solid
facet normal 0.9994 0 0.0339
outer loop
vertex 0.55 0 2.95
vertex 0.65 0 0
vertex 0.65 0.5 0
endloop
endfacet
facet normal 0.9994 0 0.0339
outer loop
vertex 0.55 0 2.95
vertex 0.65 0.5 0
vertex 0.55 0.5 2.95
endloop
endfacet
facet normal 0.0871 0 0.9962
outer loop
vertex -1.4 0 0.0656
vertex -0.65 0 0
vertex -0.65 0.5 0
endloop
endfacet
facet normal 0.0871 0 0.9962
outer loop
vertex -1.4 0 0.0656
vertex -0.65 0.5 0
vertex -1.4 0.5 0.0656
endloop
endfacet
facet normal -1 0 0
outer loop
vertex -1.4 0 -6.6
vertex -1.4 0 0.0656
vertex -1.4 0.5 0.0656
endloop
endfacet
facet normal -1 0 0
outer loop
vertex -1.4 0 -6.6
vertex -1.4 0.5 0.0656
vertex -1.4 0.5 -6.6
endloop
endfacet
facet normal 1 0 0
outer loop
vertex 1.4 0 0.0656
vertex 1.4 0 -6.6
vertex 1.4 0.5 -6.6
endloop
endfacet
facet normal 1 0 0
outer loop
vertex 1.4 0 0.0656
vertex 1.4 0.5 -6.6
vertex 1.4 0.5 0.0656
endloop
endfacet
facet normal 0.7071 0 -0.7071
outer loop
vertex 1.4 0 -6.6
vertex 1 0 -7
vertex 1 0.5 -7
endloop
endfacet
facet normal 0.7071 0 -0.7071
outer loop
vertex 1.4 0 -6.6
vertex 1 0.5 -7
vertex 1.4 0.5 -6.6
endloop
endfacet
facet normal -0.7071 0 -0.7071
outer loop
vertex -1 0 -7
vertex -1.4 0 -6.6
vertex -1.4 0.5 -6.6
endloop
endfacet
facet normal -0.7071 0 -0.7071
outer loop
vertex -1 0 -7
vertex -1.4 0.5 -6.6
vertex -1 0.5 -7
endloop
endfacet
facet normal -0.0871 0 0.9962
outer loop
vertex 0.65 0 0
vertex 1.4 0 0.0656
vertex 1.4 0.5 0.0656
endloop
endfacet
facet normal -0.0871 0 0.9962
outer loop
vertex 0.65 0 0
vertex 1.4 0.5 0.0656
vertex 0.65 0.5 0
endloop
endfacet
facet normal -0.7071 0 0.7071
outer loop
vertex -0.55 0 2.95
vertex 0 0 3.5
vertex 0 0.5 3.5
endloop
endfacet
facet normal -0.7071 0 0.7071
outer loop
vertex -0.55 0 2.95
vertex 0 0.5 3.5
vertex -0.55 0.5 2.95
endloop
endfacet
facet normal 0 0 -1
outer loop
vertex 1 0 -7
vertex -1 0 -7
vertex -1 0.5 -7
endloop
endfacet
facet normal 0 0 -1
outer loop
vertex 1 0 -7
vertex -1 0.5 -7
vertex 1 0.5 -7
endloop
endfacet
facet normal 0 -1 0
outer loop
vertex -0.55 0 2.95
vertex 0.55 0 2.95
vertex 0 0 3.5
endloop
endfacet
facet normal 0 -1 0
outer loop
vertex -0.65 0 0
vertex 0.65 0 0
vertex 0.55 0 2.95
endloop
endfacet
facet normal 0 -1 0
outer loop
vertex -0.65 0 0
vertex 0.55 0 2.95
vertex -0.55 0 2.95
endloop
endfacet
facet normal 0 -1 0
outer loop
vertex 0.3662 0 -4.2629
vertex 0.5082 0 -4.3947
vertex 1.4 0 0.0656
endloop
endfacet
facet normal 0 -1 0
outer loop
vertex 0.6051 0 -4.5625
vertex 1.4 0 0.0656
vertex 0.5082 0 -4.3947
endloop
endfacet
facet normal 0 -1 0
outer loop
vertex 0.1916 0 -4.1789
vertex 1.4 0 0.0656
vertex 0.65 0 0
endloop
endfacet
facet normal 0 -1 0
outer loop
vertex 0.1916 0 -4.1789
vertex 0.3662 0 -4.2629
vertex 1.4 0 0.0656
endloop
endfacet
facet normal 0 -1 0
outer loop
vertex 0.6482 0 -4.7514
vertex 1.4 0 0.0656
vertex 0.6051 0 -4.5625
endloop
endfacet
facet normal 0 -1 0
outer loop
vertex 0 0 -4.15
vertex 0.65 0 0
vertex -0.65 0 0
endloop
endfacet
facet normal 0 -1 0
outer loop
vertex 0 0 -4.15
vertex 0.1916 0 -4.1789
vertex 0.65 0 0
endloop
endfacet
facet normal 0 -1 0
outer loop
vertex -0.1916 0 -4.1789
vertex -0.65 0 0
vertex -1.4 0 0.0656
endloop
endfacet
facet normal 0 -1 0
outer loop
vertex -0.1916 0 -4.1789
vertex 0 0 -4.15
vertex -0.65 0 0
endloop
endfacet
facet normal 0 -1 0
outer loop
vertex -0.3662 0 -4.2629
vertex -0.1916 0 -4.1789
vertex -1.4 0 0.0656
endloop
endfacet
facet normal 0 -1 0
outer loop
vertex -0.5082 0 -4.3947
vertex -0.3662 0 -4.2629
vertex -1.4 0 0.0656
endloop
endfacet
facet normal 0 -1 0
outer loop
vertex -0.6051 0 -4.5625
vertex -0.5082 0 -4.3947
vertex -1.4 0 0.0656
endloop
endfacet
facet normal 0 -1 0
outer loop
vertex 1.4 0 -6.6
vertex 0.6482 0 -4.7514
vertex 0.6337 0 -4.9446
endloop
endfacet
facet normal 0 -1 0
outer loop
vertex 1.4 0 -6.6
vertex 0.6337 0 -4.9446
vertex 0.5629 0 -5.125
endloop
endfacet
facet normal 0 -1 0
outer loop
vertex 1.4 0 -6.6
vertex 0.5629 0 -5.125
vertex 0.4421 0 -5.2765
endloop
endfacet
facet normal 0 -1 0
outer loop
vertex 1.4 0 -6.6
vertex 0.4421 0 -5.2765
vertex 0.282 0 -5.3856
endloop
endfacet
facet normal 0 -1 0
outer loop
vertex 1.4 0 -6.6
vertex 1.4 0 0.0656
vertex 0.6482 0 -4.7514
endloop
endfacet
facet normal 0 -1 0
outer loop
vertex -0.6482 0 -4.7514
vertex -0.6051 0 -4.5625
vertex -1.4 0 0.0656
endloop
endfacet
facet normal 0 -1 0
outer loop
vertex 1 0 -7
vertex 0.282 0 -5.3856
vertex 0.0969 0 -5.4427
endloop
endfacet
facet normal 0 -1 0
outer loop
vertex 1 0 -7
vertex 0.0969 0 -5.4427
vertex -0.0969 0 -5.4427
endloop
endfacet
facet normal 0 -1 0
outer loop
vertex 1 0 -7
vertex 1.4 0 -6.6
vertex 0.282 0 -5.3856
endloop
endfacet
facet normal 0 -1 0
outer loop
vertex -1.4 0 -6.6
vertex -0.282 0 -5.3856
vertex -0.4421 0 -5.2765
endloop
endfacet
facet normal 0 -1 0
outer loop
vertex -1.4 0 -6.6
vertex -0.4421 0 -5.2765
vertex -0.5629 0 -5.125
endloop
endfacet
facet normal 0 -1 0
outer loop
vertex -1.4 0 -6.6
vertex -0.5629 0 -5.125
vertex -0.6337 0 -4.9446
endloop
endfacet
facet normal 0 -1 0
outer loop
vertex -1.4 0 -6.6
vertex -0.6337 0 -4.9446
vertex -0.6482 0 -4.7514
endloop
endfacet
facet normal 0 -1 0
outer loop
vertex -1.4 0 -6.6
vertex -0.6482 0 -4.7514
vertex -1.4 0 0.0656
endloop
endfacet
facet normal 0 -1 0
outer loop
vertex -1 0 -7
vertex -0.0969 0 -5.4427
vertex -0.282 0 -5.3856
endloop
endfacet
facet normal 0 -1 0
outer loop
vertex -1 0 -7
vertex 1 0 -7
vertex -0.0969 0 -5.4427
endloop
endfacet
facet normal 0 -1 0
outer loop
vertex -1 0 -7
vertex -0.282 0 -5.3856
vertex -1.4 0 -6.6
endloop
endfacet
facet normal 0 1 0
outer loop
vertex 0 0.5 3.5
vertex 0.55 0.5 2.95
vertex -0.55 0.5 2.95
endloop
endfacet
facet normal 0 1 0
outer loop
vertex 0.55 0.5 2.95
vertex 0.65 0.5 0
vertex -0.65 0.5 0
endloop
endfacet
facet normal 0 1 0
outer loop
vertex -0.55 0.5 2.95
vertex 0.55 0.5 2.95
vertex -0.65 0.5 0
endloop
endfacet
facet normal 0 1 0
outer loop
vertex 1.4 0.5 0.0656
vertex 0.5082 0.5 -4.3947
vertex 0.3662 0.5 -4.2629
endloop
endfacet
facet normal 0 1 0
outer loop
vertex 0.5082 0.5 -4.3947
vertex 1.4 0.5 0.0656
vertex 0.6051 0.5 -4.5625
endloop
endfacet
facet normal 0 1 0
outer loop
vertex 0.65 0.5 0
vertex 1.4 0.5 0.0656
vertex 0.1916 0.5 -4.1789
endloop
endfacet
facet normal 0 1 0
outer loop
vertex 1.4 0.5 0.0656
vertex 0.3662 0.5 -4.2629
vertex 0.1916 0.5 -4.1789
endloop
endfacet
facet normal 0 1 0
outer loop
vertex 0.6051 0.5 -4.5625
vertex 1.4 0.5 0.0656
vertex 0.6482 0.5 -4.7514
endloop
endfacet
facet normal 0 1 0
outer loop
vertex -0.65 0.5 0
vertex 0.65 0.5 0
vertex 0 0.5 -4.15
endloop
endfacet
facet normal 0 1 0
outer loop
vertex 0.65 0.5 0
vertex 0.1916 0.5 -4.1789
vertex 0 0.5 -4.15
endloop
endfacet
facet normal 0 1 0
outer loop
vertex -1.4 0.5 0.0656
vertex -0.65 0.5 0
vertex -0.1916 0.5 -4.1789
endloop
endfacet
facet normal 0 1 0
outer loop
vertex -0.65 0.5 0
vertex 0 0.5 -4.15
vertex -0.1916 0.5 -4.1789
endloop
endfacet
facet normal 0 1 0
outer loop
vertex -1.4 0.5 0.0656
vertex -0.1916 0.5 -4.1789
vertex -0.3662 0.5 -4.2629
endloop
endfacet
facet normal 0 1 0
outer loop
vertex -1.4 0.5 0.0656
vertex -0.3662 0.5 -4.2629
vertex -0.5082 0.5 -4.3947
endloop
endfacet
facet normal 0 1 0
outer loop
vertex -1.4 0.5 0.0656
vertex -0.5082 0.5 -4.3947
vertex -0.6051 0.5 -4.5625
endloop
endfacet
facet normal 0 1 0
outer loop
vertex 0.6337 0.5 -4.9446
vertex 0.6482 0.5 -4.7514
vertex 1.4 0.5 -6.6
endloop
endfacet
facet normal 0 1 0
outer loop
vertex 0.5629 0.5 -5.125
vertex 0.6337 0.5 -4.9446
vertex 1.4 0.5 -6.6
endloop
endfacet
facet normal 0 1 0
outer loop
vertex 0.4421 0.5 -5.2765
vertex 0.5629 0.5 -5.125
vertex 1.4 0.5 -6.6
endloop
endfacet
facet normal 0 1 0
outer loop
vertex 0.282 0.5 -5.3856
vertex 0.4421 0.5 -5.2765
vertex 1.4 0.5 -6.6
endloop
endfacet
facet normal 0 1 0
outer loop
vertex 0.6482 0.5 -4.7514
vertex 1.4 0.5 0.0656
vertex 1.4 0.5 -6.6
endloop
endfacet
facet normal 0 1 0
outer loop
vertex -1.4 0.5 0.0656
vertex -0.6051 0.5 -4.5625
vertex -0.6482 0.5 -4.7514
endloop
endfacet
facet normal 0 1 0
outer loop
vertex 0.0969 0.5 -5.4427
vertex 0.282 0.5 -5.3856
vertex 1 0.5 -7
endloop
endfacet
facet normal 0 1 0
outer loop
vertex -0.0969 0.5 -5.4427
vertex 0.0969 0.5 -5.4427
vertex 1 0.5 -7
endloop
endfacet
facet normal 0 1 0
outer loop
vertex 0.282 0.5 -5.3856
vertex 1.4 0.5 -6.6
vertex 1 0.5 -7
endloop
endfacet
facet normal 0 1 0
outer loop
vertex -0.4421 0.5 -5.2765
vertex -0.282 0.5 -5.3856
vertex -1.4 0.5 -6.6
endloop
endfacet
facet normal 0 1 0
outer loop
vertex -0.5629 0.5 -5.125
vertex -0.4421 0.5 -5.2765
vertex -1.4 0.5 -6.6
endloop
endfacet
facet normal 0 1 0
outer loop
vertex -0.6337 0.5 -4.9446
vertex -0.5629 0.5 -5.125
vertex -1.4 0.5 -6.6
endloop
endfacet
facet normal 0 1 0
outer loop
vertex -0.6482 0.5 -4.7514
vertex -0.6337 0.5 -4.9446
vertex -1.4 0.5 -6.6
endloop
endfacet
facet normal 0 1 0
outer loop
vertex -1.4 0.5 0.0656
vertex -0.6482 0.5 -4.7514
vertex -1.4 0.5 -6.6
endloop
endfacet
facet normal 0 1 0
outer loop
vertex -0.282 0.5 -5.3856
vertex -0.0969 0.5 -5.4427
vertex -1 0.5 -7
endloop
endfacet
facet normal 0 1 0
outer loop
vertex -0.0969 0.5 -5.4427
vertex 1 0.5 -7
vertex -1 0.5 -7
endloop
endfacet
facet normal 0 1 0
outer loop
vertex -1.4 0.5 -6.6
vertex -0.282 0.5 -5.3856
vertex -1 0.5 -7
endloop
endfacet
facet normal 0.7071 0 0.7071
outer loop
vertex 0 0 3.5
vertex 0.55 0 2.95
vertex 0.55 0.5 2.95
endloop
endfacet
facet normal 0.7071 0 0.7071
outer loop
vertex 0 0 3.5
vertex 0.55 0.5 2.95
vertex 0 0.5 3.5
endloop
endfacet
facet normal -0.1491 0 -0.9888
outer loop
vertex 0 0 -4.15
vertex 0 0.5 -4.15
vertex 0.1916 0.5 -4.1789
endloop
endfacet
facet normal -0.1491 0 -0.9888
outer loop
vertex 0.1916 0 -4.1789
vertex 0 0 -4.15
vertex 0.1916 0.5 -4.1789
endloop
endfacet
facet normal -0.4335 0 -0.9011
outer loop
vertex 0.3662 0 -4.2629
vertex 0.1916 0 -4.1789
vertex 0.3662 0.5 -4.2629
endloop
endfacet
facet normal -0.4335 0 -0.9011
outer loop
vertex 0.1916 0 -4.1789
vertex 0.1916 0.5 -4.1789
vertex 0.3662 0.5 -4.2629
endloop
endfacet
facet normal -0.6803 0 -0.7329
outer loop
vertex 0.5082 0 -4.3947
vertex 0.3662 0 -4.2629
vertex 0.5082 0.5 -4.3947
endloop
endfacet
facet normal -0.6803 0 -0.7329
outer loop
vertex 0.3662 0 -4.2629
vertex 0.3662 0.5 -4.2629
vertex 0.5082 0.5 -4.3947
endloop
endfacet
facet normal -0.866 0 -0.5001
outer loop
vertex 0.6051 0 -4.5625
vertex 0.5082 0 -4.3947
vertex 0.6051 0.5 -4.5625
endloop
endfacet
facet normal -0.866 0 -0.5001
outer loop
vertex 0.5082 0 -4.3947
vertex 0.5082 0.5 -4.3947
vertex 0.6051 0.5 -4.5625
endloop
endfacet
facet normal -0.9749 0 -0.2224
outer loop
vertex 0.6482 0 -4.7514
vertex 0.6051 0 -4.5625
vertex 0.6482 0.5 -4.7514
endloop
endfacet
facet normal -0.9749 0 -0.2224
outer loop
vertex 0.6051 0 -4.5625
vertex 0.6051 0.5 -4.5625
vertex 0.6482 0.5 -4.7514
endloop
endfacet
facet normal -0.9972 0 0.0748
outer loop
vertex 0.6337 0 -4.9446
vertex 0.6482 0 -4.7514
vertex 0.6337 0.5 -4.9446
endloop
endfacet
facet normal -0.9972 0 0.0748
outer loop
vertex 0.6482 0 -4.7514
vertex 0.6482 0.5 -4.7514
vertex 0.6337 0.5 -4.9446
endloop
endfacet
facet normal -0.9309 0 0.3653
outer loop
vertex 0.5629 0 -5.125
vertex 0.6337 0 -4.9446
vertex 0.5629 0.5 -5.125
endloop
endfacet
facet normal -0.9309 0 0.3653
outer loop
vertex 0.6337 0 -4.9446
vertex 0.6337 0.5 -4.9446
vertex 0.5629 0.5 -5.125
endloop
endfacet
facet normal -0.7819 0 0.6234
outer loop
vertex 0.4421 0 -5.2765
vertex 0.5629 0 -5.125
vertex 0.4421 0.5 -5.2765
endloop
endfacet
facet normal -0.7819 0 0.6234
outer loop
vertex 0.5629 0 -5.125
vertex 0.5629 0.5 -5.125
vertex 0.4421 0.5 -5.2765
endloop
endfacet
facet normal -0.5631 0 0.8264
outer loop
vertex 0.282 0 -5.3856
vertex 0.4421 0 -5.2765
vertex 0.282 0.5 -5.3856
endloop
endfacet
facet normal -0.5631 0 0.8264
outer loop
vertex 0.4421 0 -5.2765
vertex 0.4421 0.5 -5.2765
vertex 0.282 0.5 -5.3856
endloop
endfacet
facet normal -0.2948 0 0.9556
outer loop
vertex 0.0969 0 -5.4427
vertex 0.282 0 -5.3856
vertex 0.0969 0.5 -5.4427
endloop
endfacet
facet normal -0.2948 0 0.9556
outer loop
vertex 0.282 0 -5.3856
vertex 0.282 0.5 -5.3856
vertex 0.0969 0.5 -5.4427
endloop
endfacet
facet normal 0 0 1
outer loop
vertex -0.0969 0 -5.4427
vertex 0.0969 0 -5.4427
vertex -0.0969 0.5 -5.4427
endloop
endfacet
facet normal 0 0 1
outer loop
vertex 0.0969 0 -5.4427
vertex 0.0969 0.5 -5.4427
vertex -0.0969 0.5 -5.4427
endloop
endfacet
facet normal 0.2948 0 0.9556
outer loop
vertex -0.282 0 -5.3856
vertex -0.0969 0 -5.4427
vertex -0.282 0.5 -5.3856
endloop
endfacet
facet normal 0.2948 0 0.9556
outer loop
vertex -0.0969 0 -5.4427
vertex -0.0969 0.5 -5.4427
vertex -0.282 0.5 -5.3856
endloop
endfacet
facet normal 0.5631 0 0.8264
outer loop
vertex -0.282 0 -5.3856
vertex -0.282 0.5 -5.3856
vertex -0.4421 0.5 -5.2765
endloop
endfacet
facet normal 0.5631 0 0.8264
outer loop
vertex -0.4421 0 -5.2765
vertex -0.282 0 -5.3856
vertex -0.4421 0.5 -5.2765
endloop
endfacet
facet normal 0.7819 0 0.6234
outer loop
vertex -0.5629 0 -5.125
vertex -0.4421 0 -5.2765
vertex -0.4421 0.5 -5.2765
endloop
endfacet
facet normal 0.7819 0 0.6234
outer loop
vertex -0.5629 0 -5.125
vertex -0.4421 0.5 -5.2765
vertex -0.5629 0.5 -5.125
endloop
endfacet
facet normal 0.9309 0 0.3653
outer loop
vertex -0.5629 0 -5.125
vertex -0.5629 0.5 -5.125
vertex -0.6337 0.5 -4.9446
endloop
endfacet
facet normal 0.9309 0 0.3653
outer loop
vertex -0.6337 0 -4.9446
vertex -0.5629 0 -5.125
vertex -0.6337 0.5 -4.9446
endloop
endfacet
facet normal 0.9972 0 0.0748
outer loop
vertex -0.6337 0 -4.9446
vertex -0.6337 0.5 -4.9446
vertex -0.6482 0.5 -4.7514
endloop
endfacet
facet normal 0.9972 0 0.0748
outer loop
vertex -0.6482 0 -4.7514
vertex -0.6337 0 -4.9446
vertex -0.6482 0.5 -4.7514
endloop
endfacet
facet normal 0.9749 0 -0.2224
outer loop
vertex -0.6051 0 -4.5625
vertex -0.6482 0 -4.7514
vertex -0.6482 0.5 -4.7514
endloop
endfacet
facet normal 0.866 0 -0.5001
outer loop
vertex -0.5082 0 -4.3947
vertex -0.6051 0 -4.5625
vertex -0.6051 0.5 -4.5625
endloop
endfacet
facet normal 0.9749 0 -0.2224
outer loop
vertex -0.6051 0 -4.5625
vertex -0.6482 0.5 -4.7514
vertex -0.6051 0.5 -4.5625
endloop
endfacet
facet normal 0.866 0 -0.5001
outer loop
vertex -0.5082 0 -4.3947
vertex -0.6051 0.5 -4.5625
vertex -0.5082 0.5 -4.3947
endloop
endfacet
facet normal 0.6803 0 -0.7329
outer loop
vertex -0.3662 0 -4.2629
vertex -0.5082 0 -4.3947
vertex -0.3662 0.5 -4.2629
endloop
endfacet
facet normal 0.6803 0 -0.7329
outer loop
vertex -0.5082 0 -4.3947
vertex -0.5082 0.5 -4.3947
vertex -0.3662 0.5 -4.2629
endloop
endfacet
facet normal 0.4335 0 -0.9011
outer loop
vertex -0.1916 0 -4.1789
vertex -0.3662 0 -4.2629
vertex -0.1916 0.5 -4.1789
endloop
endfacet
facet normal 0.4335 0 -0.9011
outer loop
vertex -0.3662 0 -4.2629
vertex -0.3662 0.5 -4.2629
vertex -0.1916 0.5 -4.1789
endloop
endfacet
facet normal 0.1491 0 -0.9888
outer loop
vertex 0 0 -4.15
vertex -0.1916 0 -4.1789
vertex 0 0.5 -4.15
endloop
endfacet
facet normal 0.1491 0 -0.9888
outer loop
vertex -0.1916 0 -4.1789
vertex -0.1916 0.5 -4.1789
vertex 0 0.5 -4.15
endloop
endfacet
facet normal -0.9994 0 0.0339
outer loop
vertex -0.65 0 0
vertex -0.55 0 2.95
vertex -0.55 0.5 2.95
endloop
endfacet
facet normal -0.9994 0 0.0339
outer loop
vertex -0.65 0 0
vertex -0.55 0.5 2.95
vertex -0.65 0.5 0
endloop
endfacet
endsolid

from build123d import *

# Parameters (mm, degrees)
BOSS_EXTRUDE2_DEPTH = 0.5
SKETCH3_R           = 0.65
CUT_EXTRUDE3_DEPTH  = 0.5


with BuildPart() as part:
    # Sketch1 → Boss-Extrude2 (new body)
    with BuildSketch(Plane(origin=(0, 0, 0), x_dir=(1, 0, 0), z_dir=(0, 1, 0))):
        Polygon((-1, 7), (1, 7), (1.4, 6.6), (1.4, -0.065616498), (0.65, 0), (0.55, -2.95), (0, -3.5), (-0.55, -2.95), (-0.65, 0), (-1.4, -0.065616498), (-1.4, 6.6), align=None)
    extrude(amount=BOSS_EXTRUDE2_DEPTH)

    # Sketch3 → Cut-Extrude3 (cut)
    with BuildSketch(Plane(origin=(0, 0.5, 0), x_dir=(1, 0, 0), z_dir=(0, 1, 0))):
        with Locations(Location((0, 4.8, 0), (0, 0, 270))):
            Circle(SKETCH3_R)
    extrude(amount=-CUT_EXTRUDE3_DEPTH, mode=Mode.SUBTRACT)


solid = part.part
